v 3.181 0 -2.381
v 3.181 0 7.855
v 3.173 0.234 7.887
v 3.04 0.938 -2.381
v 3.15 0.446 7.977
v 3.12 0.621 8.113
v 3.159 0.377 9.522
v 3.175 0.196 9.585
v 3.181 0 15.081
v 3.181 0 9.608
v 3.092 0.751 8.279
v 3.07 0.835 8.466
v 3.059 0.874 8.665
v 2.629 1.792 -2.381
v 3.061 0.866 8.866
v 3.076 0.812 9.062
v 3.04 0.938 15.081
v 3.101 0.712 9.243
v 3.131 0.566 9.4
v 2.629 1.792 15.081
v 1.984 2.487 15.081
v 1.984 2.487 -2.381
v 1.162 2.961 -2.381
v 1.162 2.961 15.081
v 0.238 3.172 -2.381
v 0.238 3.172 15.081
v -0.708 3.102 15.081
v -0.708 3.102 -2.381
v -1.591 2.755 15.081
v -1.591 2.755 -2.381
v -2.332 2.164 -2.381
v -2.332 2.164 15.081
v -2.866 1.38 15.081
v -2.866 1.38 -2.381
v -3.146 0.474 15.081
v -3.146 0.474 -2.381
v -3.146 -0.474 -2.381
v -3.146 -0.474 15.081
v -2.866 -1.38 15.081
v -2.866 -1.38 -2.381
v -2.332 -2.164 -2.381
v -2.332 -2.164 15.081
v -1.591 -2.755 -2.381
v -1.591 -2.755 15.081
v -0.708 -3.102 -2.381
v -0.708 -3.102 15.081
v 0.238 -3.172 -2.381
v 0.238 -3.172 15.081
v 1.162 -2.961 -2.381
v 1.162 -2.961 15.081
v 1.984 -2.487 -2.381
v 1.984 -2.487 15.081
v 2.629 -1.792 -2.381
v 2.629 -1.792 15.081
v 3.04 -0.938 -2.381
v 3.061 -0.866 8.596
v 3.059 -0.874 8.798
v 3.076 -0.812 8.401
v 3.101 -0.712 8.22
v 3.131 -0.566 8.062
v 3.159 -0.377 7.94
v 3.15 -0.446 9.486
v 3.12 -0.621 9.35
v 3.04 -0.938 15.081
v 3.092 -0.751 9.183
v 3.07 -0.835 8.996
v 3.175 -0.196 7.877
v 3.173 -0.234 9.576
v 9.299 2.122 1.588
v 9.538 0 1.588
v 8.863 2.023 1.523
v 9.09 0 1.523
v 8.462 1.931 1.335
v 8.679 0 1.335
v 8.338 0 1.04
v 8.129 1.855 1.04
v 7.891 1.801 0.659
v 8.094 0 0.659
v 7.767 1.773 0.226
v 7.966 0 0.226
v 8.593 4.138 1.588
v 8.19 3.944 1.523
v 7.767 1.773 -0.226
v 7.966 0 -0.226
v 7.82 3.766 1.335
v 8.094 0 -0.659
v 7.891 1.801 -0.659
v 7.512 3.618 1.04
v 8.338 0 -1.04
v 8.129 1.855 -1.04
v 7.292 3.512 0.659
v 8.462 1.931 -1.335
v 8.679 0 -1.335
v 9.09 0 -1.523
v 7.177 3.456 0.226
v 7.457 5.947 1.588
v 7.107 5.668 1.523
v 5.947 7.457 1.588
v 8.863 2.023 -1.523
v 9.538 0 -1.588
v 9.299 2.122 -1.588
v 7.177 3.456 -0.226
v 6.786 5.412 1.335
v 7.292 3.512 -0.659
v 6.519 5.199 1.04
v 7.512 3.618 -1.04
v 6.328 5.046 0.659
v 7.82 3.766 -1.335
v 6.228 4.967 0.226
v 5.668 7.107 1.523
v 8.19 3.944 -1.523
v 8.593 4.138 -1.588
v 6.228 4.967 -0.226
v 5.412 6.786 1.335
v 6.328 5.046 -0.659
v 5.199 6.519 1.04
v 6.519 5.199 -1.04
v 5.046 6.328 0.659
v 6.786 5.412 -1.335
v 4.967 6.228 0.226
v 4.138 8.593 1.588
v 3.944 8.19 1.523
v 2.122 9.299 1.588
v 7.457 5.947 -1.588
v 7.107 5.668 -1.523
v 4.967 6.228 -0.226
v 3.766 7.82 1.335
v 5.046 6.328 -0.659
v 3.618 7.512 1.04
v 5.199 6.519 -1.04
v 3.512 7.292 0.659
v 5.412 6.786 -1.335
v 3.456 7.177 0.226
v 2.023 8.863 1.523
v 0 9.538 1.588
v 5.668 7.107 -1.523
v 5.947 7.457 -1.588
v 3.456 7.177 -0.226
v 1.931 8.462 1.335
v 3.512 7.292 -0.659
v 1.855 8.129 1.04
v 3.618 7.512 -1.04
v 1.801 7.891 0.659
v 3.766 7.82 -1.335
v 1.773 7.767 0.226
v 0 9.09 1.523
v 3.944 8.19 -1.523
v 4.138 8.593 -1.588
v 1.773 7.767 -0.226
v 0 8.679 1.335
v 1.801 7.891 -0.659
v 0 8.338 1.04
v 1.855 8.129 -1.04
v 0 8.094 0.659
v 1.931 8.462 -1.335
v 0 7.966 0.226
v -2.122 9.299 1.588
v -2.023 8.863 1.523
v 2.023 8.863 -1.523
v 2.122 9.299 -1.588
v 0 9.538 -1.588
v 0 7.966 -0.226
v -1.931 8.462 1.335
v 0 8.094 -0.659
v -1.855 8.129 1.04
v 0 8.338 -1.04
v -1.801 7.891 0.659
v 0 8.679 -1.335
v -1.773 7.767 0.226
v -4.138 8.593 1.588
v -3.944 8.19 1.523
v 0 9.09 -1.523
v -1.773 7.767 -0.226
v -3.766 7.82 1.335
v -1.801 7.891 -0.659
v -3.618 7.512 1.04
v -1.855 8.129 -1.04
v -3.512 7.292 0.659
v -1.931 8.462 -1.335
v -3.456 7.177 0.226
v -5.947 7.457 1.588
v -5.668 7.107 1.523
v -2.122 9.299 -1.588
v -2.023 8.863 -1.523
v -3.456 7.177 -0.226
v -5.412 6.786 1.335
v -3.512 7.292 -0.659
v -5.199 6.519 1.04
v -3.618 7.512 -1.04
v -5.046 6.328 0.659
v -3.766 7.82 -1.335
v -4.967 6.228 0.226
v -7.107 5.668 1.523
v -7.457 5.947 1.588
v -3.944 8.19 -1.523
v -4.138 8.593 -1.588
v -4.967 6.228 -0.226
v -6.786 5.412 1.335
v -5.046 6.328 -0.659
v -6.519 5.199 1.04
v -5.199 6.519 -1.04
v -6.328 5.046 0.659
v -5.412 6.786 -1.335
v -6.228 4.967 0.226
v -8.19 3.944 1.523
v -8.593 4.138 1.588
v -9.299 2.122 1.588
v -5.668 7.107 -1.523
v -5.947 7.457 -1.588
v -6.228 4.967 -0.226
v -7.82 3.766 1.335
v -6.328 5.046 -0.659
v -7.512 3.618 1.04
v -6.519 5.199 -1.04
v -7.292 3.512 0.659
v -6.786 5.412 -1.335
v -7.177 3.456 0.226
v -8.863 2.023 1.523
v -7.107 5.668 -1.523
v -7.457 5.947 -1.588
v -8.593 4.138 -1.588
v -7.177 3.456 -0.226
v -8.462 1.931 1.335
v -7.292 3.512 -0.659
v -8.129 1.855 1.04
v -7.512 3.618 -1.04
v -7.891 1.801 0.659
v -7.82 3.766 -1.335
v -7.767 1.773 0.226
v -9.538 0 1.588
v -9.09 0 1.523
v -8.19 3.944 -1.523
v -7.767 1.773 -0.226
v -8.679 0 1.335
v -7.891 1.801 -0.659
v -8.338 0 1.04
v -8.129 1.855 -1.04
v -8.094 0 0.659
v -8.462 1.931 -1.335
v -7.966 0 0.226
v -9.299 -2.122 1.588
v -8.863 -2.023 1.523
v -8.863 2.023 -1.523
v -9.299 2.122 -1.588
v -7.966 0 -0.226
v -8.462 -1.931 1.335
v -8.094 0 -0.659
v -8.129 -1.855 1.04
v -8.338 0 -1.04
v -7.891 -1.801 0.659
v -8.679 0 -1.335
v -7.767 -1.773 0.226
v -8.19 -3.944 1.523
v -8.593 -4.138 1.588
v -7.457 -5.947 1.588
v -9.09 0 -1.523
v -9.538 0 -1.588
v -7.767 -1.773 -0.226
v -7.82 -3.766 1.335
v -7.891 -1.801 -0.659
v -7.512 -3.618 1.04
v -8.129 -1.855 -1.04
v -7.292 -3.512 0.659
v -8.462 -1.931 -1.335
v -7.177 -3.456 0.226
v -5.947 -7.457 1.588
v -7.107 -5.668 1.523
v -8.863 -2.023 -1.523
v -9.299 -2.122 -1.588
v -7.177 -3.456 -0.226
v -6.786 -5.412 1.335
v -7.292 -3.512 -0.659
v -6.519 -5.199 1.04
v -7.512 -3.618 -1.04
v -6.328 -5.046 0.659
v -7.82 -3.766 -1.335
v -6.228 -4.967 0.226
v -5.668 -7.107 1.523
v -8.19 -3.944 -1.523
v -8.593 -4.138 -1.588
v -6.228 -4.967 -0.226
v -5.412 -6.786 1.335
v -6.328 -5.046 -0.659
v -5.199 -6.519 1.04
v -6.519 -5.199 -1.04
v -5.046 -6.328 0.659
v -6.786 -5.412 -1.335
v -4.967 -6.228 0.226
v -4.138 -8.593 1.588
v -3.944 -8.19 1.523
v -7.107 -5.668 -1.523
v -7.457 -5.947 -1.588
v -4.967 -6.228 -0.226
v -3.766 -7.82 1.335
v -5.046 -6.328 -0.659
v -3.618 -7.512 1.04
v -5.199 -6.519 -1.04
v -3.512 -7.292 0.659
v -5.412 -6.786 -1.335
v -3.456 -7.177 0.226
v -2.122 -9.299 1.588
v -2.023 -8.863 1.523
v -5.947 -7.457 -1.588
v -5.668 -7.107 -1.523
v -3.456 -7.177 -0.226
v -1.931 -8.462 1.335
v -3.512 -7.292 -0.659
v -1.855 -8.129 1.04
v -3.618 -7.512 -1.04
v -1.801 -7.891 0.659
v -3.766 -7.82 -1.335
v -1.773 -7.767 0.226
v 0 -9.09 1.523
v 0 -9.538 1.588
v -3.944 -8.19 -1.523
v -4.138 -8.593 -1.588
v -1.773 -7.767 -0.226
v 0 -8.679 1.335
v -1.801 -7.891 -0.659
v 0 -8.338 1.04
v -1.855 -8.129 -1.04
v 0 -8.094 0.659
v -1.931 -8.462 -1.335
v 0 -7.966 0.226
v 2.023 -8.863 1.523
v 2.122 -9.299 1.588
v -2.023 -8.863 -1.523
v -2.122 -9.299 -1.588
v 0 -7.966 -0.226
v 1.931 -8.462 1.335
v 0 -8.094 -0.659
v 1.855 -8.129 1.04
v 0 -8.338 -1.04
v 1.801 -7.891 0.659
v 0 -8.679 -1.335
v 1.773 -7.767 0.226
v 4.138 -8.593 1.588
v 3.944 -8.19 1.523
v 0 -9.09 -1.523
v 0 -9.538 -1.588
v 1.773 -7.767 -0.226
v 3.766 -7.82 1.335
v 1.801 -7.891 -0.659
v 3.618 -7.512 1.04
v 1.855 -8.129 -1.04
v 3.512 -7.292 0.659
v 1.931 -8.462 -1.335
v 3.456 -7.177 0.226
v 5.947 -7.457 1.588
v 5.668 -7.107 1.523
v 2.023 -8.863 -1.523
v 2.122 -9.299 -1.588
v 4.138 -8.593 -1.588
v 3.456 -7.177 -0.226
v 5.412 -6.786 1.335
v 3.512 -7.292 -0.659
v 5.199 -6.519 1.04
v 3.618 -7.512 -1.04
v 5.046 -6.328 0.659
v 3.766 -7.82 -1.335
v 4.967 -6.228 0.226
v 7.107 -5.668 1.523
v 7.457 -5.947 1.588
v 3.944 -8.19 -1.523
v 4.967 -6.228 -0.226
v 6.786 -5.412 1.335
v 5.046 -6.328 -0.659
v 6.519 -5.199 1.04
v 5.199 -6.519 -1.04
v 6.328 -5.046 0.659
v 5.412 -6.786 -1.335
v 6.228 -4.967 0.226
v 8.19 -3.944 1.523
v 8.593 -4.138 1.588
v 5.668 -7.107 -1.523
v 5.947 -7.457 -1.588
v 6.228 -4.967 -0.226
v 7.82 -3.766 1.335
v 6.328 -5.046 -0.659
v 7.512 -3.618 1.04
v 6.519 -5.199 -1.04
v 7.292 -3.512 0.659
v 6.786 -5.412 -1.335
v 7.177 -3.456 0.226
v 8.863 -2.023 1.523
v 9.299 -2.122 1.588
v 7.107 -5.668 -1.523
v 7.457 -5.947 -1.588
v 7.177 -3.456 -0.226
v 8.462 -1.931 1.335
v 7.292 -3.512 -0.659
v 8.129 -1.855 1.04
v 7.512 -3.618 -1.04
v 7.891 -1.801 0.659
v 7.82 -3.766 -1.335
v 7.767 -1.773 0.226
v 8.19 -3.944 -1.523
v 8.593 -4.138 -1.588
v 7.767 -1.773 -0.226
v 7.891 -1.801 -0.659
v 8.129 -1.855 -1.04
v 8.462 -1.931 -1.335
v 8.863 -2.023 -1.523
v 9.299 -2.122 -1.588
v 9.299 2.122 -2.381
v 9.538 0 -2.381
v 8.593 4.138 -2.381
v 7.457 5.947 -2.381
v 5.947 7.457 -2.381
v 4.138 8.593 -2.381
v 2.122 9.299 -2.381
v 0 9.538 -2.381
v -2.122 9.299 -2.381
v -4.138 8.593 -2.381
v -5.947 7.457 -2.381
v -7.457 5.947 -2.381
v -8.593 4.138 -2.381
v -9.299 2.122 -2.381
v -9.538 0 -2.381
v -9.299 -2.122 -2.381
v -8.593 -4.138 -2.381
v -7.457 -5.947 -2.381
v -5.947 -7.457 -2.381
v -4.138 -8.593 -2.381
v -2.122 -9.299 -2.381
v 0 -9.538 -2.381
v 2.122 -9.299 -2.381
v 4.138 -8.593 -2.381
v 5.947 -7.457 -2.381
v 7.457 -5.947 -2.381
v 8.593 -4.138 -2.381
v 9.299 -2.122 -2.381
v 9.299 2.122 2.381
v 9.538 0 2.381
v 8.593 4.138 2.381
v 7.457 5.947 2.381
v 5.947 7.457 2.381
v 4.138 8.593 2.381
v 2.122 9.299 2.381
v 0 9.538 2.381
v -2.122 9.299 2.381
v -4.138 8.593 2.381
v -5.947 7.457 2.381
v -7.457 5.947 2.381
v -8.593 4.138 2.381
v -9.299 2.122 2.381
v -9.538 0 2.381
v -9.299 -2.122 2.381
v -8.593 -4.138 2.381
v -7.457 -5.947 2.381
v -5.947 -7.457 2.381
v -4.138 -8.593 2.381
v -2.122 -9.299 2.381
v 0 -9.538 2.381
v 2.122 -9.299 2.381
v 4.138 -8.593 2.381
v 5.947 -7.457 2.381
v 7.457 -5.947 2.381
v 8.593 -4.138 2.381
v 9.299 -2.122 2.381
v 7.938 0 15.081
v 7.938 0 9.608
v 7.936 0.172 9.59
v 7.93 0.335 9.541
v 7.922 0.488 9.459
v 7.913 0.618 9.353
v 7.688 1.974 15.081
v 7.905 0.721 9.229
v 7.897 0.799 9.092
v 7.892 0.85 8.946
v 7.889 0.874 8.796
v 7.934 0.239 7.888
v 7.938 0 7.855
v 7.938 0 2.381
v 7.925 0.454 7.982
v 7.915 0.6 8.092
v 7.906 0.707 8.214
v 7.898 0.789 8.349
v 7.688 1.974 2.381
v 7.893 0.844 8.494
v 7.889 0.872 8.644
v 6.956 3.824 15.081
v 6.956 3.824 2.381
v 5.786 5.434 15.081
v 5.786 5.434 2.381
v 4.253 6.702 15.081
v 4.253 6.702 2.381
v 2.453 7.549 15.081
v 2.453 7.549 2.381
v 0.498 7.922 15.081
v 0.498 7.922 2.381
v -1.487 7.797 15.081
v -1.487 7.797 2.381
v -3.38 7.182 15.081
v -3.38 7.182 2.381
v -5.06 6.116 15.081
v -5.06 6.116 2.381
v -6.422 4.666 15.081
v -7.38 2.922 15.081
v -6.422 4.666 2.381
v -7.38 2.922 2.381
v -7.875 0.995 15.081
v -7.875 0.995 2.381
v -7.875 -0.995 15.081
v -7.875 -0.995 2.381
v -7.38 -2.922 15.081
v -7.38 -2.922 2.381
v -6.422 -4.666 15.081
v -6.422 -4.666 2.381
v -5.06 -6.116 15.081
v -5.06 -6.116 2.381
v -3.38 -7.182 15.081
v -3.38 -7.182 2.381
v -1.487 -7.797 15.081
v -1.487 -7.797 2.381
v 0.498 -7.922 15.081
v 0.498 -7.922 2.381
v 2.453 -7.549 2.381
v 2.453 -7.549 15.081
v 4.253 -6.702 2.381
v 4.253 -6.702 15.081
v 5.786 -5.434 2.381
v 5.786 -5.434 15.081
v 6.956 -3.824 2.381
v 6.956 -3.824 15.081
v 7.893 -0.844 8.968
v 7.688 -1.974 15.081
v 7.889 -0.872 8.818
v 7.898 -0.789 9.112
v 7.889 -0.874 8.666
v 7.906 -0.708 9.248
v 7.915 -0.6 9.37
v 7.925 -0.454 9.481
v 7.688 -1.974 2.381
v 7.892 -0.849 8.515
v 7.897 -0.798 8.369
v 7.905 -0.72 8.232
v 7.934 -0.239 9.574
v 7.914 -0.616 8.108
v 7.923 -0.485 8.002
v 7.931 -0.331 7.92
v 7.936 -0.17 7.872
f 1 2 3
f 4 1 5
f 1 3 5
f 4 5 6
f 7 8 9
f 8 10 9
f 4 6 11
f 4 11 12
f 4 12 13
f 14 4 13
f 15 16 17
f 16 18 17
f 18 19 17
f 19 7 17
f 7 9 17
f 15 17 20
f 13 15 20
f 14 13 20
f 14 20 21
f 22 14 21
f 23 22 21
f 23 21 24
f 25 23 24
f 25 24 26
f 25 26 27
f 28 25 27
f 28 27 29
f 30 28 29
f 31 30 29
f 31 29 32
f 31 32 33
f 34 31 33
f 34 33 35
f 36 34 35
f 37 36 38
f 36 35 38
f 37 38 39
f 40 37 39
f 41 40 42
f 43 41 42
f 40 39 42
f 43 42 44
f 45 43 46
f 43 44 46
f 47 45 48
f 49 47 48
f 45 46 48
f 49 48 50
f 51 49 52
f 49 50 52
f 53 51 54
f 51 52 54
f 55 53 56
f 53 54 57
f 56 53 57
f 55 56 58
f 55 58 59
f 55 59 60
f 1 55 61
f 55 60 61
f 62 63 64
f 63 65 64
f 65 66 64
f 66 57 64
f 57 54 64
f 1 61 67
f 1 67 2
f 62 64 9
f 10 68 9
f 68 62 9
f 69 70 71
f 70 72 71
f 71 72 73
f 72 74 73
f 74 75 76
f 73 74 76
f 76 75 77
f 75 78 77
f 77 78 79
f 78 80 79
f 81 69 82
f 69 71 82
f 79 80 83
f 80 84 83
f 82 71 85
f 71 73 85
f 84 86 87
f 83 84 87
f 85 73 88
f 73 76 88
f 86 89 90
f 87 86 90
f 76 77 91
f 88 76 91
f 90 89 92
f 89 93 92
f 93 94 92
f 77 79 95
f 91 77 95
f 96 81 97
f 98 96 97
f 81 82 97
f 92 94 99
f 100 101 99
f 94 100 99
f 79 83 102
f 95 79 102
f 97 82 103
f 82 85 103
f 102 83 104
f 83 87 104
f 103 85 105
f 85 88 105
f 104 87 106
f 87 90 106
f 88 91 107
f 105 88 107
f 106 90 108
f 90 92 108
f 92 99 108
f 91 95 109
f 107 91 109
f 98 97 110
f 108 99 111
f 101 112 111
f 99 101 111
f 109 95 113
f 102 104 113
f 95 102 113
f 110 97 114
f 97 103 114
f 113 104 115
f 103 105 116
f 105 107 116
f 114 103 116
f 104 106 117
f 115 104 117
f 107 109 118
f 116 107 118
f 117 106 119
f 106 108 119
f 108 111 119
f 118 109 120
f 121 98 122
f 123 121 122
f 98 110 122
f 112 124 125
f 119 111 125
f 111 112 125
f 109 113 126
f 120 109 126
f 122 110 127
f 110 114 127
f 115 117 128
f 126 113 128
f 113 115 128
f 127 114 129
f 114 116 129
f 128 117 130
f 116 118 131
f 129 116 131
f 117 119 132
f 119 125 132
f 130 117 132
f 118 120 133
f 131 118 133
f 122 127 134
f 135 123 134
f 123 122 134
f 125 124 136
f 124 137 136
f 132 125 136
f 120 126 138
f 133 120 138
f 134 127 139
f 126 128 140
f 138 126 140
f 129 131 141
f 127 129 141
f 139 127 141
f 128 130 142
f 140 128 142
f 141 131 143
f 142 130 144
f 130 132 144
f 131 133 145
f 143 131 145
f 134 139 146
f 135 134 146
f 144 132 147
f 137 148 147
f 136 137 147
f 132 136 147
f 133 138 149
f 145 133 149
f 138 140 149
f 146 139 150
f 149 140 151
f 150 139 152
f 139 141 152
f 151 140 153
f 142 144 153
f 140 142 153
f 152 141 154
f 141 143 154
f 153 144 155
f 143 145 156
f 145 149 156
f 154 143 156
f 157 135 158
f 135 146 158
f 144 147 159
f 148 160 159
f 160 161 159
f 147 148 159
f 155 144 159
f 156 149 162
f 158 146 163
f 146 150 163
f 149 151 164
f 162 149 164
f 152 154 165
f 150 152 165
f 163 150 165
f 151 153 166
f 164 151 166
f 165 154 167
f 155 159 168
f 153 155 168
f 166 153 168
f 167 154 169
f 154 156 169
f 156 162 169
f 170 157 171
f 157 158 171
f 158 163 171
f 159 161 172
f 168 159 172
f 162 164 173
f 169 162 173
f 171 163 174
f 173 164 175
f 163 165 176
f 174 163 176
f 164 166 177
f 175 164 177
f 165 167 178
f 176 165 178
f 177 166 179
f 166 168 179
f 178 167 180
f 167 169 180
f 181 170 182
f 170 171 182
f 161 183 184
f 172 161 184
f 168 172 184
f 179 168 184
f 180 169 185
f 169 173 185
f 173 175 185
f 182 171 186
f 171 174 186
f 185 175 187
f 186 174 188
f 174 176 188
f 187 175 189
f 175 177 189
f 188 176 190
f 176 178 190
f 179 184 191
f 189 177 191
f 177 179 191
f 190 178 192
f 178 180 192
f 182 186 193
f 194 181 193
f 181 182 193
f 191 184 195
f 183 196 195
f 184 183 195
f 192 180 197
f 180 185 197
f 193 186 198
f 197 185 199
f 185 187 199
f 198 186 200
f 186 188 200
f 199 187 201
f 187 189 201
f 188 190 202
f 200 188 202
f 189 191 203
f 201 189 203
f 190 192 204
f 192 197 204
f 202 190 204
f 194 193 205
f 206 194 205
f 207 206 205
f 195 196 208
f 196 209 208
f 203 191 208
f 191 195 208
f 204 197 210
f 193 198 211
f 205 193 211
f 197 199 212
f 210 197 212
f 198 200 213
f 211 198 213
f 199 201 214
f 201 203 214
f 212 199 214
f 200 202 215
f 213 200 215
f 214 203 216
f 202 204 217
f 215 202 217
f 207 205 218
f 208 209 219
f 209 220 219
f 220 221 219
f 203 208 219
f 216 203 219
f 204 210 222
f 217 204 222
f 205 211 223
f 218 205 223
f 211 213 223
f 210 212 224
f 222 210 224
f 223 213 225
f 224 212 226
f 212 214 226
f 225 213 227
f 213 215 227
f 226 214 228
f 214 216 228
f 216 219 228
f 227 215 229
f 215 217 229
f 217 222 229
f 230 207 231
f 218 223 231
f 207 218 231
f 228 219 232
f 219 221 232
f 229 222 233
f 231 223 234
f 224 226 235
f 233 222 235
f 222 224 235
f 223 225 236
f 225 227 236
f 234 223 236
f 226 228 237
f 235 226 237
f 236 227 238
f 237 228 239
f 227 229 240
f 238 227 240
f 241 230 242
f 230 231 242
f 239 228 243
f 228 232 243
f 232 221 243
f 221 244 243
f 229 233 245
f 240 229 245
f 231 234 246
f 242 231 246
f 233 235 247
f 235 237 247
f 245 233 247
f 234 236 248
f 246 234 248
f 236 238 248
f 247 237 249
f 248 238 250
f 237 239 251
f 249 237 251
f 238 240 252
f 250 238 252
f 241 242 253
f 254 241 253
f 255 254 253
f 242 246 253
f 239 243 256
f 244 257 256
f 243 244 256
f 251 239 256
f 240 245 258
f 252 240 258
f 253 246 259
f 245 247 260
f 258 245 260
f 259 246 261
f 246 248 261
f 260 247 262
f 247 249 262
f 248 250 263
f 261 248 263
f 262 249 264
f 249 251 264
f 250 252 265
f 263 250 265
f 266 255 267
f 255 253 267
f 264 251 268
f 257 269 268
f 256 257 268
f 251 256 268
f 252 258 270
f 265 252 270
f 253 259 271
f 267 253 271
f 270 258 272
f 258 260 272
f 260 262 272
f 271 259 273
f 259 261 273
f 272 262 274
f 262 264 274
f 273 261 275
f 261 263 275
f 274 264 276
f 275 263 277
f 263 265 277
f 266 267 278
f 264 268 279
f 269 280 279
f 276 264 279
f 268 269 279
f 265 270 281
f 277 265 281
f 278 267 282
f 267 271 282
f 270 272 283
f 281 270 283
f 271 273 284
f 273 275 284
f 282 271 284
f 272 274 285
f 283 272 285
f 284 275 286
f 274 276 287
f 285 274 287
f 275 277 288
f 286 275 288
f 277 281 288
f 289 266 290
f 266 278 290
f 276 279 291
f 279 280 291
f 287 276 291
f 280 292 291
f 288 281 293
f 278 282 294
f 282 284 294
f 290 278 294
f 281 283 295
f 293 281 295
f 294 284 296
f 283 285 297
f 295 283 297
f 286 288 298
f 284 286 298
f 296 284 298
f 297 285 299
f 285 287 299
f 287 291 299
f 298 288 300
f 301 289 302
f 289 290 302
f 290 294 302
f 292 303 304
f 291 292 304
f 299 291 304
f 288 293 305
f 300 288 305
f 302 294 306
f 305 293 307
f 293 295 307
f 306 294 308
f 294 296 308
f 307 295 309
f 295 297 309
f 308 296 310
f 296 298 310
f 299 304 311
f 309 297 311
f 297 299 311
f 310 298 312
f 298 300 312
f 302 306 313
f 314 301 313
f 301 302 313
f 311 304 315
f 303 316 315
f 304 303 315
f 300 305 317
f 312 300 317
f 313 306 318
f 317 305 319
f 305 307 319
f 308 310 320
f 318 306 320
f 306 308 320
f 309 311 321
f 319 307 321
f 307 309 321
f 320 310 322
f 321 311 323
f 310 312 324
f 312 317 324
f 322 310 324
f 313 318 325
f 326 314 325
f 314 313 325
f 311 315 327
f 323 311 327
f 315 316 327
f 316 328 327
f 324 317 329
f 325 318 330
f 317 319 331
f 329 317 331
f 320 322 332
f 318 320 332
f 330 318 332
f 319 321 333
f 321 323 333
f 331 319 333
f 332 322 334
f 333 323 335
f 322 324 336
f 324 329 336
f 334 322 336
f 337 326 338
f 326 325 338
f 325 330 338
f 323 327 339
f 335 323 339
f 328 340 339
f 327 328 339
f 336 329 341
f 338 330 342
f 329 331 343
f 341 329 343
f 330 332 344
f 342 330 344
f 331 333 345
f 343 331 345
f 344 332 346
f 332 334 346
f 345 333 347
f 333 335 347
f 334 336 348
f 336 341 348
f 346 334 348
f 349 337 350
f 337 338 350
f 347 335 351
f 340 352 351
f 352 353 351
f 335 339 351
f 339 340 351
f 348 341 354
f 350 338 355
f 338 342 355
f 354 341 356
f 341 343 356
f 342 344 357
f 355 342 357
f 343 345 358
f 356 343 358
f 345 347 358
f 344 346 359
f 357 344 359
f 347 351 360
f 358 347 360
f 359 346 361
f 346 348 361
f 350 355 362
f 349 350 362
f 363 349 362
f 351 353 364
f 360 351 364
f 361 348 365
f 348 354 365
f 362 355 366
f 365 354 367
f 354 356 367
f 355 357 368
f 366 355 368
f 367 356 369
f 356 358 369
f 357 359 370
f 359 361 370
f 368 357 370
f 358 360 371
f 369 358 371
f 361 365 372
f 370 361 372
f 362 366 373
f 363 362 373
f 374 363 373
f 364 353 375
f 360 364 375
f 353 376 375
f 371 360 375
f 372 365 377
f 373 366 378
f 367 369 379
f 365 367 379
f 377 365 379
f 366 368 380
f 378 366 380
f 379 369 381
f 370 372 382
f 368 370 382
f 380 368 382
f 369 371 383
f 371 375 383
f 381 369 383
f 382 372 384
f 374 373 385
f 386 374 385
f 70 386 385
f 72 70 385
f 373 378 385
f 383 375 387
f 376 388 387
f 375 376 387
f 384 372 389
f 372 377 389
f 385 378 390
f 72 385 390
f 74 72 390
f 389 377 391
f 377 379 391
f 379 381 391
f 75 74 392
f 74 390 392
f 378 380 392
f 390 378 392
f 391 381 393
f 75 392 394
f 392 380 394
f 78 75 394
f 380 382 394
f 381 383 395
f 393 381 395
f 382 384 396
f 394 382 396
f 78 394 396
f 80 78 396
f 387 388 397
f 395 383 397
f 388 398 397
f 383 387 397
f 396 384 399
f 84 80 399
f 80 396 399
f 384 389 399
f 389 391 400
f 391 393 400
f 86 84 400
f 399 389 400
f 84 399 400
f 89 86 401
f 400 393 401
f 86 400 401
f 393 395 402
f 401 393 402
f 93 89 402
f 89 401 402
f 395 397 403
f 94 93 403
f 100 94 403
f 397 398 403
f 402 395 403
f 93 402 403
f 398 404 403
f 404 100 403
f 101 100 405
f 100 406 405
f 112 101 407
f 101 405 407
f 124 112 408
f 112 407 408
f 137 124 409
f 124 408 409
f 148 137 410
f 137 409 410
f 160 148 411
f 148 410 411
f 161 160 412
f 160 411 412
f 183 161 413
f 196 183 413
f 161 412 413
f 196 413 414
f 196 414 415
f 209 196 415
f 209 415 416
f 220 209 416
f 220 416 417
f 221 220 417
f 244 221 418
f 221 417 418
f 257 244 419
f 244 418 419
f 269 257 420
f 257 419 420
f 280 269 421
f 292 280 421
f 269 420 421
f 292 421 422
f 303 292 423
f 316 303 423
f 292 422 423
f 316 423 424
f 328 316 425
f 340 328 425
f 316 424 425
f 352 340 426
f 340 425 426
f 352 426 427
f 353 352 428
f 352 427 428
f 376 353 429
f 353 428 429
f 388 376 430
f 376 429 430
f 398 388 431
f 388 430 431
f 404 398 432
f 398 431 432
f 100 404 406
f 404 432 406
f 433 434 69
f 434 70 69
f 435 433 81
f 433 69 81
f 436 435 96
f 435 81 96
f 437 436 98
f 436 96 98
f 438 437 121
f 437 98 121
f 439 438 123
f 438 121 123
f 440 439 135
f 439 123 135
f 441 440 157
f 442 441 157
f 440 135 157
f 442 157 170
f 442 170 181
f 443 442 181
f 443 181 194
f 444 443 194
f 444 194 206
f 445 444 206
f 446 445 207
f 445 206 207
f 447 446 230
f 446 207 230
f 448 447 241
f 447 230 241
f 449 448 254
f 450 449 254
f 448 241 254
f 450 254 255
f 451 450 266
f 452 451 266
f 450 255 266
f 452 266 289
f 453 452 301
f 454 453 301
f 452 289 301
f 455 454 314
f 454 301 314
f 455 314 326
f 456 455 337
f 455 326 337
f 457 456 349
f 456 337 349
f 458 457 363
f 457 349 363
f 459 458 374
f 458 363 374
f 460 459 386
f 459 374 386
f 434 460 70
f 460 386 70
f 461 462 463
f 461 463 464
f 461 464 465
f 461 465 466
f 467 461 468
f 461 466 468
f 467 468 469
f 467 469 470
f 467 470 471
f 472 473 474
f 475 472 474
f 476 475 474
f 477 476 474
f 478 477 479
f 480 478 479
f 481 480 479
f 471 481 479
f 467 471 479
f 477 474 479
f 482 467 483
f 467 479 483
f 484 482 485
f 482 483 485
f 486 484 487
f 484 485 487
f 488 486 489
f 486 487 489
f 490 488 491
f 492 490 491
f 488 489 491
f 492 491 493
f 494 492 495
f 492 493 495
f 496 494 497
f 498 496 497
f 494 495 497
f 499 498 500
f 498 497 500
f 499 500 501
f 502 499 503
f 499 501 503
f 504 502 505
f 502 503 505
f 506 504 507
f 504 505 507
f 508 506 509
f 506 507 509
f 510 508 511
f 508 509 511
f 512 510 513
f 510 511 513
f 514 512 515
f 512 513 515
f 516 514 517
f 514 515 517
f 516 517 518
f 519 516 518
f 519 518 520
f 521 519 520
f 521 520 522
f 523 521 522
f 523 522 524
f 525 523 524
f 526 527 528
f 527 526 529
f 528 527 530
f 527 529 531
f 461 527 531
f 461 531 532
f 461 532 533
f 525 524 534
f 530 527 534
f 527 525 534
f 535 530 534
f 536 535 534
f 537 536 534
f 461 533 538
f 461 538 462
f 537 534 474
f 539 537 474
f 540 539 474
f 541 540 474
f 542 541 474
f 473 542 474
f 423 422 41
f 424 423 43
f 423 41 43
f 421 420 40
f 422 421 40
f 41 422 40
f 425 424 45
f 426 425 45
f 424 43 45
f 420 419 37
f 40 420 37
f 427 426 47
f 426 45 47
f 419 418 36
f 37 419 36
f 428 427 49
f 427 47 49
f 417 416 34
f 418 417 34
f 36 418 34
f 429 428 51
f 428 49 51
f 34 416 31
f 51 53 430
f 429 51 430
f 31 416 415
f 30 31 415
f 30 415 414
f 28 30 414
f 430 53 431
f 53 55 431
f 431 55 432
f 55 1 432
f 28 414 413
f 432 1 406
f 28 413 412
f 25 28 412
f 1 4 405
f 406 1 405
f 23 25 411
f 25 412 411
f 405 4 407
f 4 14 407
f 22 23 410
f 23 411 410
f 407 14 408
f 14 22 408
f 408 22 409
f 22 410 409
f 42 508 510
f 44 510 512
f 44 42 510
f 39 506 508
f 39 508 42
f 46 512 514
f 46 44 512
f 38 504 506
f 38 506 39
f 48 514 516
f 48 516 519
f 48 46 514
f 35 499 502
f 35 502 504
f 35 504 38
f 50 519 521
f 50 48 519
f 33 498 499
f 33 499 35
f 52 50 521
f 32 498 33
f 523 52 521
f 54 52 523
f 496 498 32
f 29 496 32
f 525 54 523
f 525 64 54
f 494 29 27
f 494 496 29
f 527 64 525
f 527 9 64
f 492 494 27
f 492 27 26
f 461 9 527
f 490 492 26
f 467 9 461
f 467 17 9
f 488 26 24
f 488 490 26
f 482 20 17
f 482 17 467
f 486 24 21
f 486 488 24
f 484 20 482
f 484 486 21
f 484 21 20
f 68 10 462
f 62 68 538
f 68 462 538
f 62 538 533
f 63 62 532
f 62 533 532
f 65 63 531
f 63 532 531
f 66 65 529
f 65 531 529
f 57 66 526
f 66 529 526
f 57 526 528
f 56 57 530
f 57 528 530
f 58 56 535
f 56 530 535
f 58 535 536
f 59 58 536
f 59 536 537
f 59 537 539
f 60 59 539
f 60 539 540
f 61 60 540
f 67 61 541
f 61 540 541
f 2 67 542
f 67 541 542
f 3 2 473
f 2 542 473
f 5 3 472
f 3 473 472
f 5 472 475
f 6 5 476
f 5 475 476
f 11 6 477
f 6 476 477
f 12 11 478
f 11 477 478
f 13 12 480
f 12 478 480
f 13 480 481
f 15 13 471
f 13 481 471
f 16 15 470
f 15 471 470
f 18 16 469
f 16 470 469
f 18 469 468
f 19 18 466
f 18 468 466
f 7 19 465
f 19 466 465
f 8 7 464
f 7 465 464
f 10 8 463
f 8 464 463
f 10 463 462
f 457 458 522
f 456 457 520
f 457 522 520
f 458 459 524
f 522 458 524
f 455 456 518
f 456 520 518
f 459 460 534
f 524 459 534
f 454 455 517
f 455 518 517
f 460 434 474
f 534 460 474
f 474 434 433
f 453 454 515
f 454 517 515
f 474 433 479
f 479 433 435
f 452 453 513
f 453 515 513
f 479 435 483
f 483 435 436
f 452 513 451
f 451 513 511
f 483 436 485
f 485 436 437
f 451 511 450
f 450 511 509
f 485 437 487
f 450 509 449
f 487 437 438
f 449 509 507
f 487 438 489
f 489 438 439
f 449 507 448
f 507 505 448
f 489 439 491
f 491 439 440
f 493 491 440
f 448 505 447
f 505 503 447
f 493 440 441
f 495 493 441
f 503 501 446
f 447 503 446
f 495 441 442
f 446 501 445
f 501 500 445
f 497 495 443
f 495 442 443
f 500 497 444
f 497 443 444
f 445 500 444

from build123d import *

# Parameters (mm, degrees)
SKETCH2_R           = 7.9375
BOSS_EXTRUDE1_DEPTH = 12.7
HOLE1_D             = 6.3627
SKETCH5_W           = 0.8763
SKETCH5_H           = 6.479418435


with BuildPart() as part:
    # Sketch1 → Revolve1 (revolve)
    with BuildSketch(Plane(origin=(0, 0, 0), x_dir=(1, 0, 0), z_dir=(0, 1, 0))):
        with BuildLine():
            Line((9.5377, 2.38125), (0, 2.38125))
            Line((0, 2.38125), (0, -2.38125))
            Line((0, -2.38125), (9.5377, -2.38125))
            Line((9.5377, -2.38125), (9.5377, -1.5875))
            ThreePointArc((9.5377, -1.5875), (7.9502, 0), (9.5377, 1.5875))
            Line((9.5377, 1.5875), (9.5377, 2.38125))
        make_face()
    revolve(axis=Axis((0, 0, -2.38125), (0, 0, 1)))

    # Sketch2 → Boss-Extrude1 (add)
    with BuildSketch(Plane.XY.offset(2.38125)):
        Circle(SKETCH2_R)
    extrude(amount=BOSS_EXTRUDE1_DEPTH)

    # Hole1 (through all)
    with Locations(Plane(origin=(0, 0, -2.38125), x_dir=(-1, 0, 0), z_dir=(0, 0, -1))):
        with Locations((0, 0)):
            Hole(HOLE1_D / 2)

    # Sketch5 → M1.6 Clearance Hole1 (revolve, cut)
    with BuildSketch(Plane(origin=(3.058281565, 0, 8.73125), x_dir=(0, 0, 1), z_dir=(0, 1, 0))):
        with Locations((0.43815, 3.239709218)):
            Rectangle(SKETCH5_W, SKETCH5_H)
    revolve(axis=Axis((-3.291718435, 0, 8.73125), (1, 0, 0)), mode=Mode.SUBTRACT)


solid = part.part
